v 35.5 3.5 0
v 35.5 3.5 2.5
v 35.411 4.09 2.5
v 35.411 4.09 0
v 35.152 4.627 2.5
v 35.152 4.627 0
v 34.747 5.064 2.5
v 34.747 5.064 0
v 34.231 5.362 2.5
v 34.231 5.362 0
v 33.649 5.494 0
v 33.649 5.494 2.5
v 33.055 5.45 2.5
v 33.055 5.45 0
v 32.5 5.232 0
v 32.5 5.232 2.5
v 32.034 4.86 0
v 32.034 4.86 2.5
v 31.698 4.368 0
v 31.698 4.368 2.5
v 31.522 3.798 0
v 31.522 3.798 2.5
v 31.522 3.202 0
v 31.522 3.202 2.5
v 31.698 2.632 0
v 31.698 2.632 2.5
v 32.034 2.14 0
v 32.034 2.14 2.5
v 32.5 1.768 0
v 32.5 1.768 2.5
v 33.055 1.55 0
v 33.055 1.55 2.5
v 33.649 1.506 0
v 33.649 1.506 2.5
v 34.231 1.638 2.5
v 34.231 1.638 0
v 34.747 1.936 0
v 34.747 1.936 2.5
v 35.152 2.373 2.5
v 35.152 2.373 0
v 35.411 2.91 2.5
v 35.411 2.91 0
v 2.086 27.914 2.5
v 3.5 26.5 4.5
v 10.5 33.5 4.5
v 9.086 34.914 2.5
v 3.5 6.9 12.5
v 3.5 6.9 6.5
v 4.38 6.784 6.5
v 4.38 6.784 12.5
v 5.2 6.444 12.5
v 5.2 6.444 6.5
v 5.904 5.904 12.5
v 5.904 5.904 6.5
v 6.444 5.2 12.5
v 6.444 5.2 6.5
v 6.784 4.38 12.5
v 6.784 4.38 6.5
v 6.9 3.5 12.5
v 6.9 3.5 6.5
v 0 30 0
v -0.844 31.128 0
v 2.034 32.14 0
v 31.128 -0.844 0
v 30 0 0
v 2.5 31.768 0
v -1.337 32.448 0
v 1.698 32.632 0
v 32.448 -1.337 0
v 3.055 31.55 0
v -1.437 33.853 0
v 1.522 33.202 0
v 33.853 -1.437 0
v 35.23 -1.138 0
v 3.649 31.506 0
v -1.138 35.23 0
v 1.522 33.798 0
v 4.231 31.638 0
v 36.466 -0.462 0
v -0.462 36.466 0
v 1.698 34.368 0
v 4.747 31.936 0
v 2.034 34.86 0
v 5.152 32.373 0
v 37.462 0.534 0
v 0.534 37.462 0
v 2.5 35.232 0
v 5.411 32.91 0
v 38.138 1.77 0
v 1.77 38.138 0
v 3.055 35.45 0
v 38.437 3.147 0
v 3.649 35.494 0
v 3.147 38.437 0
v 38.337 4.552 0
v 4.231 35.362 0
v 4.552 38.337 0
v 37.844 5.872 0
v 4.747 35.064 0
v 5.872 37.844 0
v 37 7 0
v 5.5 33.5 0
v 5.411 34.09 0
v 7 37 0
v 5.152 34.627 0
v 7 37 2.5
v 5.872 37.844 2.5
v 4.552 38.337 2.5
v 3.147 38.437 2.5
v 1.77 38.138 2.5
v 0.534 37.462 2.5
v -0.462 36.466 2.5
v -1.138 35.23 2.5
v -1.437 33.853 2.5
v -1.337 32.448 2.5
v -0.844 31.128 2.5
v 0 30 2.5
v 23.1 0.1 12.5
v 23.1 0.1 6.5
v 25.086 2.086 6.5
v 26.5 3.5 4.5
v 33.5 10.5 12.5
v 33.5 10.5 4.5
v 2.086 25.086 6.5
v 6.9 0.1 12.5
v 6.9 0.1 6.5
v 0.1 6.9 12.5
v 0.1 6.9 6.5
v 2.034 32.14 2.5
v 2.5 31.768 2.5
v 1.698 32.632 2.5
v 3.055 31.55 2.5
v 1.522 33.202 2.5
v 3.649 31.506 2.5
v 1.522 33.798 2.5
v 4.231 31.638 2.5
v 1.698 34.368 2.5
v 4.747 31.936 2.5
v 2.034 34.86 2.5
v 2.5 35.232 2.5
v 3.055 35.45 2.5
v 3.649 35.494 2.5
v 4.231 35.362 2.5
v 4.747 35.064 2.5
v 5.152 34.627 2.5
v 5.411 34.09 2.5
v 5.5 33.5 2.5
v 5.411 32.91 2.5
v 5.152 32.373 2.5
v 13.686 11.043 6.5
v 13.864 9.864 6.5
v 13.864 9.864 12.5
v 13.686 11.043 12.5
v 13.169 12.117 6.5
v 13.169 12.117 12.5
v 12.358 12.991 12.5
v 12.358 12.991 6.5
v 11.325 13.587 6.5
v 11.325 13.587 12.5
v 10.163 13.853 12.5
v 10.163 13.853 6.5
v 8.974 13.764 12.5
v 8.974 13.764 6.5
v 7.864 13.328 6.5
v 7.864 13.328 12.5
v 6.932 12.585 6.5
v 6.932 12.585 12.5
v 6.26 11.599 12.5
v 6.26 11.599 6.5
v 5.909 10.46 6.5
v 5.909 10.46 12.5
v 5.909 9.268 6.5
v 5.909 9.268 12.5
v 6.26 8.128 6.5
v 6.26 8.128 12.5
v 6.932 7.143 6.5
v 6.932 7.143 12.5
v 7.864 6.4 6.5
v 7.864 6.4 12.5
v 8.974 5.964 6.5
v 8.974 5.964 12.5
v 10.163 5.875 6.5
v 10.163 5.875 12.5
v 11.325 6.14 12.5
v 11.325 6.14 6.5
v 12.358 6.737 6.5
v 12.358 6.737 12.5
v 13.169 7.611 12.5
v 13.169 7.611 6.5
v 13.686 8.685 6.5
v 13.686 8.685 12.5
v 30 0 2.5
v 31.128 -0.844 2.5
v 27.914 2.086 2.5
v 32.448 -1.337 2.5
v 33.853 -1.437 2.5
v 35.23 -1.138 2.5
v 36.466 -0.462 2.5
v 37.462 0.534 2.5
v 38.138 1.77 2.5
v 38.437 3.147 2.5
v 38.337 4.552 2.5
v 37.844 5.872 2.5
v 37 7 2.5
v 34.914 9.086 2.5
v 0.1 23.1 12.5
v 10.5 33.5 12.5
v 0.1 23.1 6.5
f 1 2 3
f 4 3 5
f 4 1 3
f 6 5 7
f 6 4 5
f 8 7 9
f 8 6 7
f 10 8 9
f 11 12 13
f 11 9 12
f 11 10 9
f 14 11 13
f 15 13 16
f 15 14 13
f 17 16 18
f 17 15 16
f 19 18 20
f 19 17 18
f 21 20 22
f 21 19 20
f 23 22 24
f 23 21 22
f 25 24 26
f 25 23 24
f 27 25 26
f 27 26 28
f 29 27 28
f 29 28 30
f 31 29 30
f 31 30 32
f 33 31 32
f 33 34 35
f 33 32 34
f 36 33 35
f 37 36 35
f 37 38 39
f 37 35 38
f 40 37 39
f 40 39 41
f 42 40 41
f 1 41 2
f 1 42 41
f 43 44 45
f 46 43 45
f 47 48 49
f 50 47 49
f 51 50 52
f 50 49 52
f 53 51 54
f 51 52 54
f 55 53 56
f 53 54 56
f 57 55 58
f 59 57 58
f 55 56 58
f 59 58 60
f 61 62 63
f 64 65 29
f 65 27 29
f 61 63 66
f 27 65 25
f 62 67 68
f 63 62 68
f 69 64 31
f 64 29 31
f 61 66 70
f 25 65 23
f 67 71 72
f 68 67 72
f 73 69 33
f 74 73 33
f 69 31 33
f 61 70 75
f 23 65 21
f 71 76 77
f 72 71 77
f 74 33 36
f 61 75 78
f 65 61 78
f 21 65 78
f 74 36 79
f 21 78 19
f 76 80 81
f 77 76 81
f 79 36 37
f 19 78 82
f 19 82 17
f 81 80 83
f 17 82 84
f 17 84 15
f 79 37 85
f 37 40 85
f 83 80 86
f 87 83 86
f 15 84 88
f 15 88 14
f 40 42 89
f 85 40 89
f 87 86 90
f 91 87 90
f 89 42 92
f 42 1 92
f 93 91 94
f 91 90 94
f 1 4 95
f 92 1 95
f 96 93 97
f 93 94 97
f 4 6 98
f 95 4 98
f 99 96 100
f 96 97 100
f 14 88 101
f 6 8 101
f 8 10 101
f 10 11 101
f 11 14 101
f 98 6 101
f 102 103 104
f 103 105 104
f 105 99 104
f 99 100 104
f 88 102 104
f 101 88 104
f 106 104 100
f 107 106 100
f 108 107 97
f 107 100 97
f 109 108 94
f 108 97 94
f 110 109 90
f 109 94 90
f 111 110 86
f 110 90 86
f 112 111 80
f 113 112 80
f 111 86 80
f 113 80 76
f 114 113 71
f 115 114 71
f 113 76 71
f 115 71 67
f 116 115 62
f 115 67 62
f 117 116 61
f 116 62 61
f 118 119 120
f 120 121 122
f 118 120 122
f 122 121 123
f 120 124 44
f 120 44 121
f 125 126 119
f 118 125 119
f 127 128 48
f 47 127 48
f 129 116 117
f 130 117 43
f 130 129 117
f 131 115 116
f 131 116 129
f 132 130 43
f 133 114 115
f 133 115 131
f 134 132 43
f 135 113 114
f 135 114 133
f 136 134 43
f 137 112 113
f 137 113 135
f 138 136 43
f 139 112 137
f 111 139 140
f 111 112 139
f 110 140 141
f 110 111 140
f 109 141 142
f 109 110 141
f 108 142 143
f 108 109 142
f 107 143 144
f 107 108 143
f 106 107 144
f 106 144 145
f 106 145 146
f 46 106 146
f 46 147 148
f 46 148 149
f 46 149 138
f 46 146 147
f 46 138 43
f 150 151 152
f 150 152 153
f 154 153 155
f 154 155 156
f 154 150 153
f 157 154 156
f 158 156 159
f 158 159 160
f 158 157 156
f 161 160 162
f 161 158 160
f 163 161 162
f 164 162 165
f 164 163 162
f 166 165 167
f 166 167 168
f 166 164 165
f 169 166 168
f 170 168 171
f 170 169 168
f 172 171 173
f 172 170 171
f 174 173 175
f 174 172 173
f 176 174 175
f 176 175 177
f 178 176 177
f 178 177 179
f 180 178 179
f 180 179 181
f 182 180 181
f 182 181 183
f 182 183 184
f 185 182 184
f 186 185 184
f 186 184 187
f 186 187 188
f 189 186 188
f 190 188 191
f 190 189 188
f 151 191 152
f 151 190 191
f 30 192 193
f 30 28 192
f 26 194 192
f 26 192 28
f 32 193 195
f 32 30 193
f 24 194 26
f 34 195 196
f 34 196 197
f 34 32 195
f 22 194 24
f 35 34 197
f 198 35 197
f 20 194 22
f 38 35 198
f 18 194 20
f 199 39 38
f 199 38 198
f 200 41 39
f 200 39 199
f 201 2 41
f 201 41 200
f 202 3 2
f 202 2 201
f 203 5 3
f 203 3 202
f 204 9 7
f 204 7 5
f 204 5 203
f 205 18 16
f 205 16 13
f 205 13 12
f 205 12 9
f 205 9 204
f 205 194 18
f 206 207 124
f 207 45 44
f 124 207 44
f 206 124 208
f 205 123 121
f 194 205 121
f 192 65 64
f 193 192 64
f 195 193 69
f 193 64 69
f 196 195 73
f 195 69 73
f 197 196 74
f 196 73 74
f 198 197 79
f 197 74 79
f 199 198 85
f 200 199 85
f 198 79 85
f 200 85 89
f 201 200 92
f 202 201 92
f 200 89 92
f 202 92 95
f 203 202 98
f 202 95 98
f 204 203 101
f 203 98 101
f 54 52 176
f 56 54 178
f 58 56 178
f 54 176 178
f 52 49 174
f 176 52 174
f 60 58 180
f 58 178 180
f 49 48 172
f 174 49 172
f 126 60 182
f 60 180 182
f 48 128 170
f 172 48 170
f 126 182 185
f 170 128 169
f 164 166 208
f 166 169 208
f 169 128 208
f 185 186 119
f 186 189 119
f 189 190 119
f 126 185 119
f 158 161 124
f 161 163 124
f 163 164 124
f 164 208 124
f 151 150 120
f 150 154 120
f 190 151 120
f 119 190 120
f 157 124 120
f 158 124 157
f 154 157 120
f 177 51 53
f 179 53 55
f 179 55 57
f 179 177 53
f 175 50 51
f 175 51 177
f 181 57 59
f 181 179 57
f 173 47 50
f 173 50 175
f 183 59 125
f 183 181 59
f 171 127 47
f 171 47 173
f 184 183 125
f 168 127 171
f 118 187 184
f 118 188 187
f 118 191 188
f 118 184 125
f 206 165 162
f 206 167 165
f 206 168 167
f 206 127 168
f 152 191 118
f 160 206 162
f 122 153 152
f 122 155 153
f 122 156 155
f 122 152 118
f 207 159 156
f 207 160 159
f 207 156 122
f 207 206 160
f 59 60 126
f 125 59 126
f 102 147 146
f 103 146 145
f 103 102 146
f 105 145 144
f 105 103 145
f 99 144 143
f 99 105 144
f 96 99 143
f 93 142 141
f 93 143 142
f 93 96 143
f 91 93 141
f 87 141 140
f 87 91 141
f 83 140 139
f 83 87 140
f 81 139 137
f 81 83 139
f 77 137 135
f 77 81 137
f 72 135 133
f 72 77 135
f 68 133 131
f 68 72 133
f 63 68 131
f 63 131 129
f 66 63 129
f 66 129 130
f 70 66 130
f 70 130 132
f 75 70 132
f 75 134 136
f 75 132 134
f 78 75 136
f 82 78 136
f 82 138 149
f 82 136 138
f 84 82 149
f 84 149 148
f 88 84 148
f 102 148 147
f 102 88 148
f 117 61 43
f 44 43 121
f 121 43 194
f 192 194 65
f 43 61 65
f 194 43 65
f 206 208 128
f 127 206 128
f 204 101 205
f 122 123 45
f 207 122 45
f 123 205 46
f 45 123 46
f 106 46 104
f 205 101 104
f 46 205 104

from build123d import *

# Parameters (mm, degrees)
F0_R     = 2
F1_DEPTH = 6.5
F3_DEPTH = 4
F4_R     = 4
F5_DEPTH = 6
F6_SIZE  = 1.99999


# Not quite as in the source:
# - a fillet or chamfer is up to 0.001 mm smaller than in the source, because OpenCascade refuses the exact size


with BuildPart() as f1:
    # F0 (on Top) → F1 (new body)
    with BuildSketch(Plane.XY):
        with BuildLine():
            Line((37, 7), (7, 37))
            ThreePointArc((7, 37), (0, 37), (0, 30))
            Line((0, 30), (30, 0))
            ThreePointArc((30, 0), (37, 0), (37, 7))
        make_face()
        with Locations((33.5, 3.5)):
            Circle(F0_R, mode=Mode.SUBTRACT)
        with Locations((3.5, 33.5)):
            Circle(F0_R, mode=Mode.SUBTRACT)
    extrude(amount=F1_DEPTH)

    # F2 (on face) → F3 (cut)
    with BuildSketch(Plane.XY.offset(6.5)):
        with BuildLine():
            Line((10.5, 33.5), (7, 37))
            ThreePointArc((7, 37), (0, 37), (0, 30))
            Line((0, 30), (3.5, 26.5))
            Line((3.5, 26.5), (10.5, 33.5))
        make_face()
        with BuildLine():
            Line((26.5, 3.5), (30, 0))
            ThreePointArc((30, 0), (37, 0), (37, 7))
            Line((37, 7), (33.5, 10.5))
            Line((33.5, 10.5), (26.5, 3.5))
        make_face()
    extrude(amount=-F3_DEPTH, mode=Mode.SUBTRACT)

    # F4 (on face) → F5 (join)
    with BuildSketch(Plane.XY.offset(6.5)):
        with BuildLine():
            ThreePointArc((3.5, 6.9), (5.904163056, 5.904163056), (6.9, 3.5))
            Line((6.9, 3.5), (6.9, 0.1))
            Line((6.9, 0.1), (23.1, 0.1))
            Line((23.1, 0.1), (33.5, 10.5))
            Line((33.5, 10.5), (10.5, 33.5))
            Line((10.5, 33.5), (0.1, 23.1))
            Line((0.1, 23.1), (0.1, 6.9))
            Line((0.1, 6.9), (3.5, 6.9))
        make_face()
        with Locations((9.8639610307, 9.8639610307)):
            Circle(F4_R, mode=Mode.SUBTRACT)
    extrude(amount=F5_DEPTH)

    # F6 (size 2 in the source; OpenCascade refuses exactly that, so slightly less here)
    f6_edges = [f1.edges().sort_by_distance(p)[0] for p in [
        (7, 30, 2.5),
        (15, 15, 6.5),
        (30, 7, 2.5),
    ]]
    chamfer(f6_edges, length=F6_SIZE)


solid = f1.part
